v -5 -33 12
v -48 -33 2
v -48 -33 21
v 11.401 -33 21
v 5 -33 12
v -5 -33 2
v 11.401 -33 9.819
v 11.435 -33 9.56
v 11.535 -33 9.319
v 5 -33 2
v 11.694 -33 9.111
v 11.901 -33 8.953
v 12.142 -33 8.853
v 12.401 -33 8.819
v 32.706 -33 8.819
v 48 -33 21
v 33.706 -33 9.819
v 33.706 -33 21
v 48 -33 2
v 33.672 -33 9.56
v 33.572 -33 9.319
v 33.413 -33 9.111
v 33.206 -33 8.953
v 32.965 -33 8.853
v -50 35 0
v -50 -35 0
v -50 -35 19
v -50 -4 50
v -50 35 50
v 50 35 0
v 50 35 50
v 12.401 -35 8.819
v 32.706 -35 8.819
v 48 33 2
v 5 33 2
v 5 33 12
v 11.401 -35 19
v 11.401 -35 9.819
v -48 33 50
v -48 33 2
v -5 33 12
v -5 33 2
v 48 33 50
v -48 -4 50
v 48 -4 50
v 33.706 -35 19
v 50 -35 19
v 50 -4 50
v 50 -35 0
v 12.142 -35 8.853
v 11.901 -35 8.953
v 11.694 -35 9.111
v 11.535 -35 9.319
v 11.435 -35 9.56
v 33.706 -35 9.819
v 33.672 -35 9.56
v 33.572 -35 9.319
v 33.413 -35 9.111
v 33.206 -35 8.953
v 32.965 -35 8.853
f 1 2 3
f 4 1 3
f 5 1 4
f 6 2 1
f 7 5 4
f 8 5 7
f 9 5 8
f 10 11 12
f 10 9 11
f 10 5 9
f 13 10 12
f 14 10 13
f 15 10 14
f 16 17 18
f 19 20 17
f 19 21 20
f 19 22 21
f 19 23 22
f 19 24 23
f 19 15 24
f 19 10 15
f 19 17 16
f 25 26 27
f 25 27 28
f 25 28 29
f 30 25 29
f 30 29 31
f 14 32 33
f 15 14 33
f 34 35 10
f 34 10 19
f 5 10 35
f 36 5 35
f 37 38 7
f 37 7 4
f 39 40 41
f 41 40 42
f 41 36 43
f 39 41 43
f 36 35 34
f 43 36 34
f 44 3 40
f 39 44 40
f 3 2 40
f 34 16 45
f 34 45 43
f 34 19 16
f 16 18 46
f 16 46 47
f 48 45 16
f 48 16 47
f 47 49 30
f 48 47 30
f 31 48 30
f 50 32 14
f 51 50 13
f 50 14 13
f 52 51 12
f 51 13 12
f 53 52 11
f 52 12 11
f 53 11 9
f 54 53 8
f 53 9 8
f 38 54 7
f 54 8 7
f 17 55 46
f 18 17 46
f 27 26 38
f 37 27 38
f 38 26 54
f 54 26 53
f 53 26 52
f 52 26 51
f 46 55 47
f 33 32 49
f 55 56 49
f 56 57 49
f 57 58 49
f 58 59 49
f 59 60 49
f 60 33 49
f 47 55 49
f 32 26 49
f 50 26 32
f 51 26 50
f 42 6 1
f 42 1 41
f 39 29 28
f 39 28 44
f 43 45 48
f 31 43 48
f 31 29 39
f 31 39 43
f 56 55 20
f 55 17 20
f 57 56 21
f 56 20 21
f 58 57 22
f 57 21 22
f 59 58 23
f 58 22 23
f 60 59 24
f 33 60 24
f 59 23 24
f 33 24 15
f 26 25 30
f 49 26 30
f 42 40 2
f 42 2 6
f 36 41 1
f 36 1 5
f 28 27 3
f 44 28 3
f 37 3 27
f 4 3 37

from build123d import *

# Parameters (mm, degrees)
SKETCH_W     = 100
SKETCH_H     = 70
PAD_DEPTH    = 50
CHAMFER_SIZE = 31
THICKNESS_T  = -2
SKETCH001_W  = 10
SKETCH001_H  = 66
PAD001_DEPTH = 10
SKETCH002_W  = 22.304644
SKETCH002_H  = 12.181445
POCKET_DEPTH = 11
FILLET_R     = 1


with BuildPart() as part:
    # Sketch → Pad (new body)
    with BuildSketch(Plane.XY):
        Rectangle(SKETCH_W, SKETCH_H)
    extrude(amount=PAD_DEPTH)

    # Chamfer
    chamfer_edges = [part.edges().sort_by_distance(p)[0] for p in [
        (0, -35, 50),
    ]]
    chamfer(chamfer_edges, length=CHAMFER_SIZE)

    # Thickness
    thickness_openings = [part.faces().sort_by_distance(p)[0] for p in [
        (0, 15.5, 50),
        (0, -19.5, 34.5),
    ]]
    offset(amount=THICKNESS_T, openings=thickness_openings)

    # Sketch001 (on Face12 of Thickness) → Pad001 (join)
    with BuildSketch(Plane.XY.offset(2)):
        Rectangle(SKETCH001_W, SKETCH001_H)
    extrude(amount=PAD001_DEPTH)

    # Sketch002 (on Face1 of Pad001) → Pocket (cut)
    with BuildSketch(Plane.XZ.offset(35)):
        with Locations((22.553599, 14.909277)):
            Rectangle(SKETCH002_W, SKETCH002_H)
    extrude(amount=-POCKET_DEPTH, mode=Mode.SUBTRACT)

    # Fillet
    fillet_edges = [part.edges().sort_by_distance(p)[0] for p in [
        (33.705921, -34, 8.818555),
        (11.401277, -34, 8.818555),
    ]]
    fillet(fillet_edges, radius=FILLET_R)


solid = part.part
